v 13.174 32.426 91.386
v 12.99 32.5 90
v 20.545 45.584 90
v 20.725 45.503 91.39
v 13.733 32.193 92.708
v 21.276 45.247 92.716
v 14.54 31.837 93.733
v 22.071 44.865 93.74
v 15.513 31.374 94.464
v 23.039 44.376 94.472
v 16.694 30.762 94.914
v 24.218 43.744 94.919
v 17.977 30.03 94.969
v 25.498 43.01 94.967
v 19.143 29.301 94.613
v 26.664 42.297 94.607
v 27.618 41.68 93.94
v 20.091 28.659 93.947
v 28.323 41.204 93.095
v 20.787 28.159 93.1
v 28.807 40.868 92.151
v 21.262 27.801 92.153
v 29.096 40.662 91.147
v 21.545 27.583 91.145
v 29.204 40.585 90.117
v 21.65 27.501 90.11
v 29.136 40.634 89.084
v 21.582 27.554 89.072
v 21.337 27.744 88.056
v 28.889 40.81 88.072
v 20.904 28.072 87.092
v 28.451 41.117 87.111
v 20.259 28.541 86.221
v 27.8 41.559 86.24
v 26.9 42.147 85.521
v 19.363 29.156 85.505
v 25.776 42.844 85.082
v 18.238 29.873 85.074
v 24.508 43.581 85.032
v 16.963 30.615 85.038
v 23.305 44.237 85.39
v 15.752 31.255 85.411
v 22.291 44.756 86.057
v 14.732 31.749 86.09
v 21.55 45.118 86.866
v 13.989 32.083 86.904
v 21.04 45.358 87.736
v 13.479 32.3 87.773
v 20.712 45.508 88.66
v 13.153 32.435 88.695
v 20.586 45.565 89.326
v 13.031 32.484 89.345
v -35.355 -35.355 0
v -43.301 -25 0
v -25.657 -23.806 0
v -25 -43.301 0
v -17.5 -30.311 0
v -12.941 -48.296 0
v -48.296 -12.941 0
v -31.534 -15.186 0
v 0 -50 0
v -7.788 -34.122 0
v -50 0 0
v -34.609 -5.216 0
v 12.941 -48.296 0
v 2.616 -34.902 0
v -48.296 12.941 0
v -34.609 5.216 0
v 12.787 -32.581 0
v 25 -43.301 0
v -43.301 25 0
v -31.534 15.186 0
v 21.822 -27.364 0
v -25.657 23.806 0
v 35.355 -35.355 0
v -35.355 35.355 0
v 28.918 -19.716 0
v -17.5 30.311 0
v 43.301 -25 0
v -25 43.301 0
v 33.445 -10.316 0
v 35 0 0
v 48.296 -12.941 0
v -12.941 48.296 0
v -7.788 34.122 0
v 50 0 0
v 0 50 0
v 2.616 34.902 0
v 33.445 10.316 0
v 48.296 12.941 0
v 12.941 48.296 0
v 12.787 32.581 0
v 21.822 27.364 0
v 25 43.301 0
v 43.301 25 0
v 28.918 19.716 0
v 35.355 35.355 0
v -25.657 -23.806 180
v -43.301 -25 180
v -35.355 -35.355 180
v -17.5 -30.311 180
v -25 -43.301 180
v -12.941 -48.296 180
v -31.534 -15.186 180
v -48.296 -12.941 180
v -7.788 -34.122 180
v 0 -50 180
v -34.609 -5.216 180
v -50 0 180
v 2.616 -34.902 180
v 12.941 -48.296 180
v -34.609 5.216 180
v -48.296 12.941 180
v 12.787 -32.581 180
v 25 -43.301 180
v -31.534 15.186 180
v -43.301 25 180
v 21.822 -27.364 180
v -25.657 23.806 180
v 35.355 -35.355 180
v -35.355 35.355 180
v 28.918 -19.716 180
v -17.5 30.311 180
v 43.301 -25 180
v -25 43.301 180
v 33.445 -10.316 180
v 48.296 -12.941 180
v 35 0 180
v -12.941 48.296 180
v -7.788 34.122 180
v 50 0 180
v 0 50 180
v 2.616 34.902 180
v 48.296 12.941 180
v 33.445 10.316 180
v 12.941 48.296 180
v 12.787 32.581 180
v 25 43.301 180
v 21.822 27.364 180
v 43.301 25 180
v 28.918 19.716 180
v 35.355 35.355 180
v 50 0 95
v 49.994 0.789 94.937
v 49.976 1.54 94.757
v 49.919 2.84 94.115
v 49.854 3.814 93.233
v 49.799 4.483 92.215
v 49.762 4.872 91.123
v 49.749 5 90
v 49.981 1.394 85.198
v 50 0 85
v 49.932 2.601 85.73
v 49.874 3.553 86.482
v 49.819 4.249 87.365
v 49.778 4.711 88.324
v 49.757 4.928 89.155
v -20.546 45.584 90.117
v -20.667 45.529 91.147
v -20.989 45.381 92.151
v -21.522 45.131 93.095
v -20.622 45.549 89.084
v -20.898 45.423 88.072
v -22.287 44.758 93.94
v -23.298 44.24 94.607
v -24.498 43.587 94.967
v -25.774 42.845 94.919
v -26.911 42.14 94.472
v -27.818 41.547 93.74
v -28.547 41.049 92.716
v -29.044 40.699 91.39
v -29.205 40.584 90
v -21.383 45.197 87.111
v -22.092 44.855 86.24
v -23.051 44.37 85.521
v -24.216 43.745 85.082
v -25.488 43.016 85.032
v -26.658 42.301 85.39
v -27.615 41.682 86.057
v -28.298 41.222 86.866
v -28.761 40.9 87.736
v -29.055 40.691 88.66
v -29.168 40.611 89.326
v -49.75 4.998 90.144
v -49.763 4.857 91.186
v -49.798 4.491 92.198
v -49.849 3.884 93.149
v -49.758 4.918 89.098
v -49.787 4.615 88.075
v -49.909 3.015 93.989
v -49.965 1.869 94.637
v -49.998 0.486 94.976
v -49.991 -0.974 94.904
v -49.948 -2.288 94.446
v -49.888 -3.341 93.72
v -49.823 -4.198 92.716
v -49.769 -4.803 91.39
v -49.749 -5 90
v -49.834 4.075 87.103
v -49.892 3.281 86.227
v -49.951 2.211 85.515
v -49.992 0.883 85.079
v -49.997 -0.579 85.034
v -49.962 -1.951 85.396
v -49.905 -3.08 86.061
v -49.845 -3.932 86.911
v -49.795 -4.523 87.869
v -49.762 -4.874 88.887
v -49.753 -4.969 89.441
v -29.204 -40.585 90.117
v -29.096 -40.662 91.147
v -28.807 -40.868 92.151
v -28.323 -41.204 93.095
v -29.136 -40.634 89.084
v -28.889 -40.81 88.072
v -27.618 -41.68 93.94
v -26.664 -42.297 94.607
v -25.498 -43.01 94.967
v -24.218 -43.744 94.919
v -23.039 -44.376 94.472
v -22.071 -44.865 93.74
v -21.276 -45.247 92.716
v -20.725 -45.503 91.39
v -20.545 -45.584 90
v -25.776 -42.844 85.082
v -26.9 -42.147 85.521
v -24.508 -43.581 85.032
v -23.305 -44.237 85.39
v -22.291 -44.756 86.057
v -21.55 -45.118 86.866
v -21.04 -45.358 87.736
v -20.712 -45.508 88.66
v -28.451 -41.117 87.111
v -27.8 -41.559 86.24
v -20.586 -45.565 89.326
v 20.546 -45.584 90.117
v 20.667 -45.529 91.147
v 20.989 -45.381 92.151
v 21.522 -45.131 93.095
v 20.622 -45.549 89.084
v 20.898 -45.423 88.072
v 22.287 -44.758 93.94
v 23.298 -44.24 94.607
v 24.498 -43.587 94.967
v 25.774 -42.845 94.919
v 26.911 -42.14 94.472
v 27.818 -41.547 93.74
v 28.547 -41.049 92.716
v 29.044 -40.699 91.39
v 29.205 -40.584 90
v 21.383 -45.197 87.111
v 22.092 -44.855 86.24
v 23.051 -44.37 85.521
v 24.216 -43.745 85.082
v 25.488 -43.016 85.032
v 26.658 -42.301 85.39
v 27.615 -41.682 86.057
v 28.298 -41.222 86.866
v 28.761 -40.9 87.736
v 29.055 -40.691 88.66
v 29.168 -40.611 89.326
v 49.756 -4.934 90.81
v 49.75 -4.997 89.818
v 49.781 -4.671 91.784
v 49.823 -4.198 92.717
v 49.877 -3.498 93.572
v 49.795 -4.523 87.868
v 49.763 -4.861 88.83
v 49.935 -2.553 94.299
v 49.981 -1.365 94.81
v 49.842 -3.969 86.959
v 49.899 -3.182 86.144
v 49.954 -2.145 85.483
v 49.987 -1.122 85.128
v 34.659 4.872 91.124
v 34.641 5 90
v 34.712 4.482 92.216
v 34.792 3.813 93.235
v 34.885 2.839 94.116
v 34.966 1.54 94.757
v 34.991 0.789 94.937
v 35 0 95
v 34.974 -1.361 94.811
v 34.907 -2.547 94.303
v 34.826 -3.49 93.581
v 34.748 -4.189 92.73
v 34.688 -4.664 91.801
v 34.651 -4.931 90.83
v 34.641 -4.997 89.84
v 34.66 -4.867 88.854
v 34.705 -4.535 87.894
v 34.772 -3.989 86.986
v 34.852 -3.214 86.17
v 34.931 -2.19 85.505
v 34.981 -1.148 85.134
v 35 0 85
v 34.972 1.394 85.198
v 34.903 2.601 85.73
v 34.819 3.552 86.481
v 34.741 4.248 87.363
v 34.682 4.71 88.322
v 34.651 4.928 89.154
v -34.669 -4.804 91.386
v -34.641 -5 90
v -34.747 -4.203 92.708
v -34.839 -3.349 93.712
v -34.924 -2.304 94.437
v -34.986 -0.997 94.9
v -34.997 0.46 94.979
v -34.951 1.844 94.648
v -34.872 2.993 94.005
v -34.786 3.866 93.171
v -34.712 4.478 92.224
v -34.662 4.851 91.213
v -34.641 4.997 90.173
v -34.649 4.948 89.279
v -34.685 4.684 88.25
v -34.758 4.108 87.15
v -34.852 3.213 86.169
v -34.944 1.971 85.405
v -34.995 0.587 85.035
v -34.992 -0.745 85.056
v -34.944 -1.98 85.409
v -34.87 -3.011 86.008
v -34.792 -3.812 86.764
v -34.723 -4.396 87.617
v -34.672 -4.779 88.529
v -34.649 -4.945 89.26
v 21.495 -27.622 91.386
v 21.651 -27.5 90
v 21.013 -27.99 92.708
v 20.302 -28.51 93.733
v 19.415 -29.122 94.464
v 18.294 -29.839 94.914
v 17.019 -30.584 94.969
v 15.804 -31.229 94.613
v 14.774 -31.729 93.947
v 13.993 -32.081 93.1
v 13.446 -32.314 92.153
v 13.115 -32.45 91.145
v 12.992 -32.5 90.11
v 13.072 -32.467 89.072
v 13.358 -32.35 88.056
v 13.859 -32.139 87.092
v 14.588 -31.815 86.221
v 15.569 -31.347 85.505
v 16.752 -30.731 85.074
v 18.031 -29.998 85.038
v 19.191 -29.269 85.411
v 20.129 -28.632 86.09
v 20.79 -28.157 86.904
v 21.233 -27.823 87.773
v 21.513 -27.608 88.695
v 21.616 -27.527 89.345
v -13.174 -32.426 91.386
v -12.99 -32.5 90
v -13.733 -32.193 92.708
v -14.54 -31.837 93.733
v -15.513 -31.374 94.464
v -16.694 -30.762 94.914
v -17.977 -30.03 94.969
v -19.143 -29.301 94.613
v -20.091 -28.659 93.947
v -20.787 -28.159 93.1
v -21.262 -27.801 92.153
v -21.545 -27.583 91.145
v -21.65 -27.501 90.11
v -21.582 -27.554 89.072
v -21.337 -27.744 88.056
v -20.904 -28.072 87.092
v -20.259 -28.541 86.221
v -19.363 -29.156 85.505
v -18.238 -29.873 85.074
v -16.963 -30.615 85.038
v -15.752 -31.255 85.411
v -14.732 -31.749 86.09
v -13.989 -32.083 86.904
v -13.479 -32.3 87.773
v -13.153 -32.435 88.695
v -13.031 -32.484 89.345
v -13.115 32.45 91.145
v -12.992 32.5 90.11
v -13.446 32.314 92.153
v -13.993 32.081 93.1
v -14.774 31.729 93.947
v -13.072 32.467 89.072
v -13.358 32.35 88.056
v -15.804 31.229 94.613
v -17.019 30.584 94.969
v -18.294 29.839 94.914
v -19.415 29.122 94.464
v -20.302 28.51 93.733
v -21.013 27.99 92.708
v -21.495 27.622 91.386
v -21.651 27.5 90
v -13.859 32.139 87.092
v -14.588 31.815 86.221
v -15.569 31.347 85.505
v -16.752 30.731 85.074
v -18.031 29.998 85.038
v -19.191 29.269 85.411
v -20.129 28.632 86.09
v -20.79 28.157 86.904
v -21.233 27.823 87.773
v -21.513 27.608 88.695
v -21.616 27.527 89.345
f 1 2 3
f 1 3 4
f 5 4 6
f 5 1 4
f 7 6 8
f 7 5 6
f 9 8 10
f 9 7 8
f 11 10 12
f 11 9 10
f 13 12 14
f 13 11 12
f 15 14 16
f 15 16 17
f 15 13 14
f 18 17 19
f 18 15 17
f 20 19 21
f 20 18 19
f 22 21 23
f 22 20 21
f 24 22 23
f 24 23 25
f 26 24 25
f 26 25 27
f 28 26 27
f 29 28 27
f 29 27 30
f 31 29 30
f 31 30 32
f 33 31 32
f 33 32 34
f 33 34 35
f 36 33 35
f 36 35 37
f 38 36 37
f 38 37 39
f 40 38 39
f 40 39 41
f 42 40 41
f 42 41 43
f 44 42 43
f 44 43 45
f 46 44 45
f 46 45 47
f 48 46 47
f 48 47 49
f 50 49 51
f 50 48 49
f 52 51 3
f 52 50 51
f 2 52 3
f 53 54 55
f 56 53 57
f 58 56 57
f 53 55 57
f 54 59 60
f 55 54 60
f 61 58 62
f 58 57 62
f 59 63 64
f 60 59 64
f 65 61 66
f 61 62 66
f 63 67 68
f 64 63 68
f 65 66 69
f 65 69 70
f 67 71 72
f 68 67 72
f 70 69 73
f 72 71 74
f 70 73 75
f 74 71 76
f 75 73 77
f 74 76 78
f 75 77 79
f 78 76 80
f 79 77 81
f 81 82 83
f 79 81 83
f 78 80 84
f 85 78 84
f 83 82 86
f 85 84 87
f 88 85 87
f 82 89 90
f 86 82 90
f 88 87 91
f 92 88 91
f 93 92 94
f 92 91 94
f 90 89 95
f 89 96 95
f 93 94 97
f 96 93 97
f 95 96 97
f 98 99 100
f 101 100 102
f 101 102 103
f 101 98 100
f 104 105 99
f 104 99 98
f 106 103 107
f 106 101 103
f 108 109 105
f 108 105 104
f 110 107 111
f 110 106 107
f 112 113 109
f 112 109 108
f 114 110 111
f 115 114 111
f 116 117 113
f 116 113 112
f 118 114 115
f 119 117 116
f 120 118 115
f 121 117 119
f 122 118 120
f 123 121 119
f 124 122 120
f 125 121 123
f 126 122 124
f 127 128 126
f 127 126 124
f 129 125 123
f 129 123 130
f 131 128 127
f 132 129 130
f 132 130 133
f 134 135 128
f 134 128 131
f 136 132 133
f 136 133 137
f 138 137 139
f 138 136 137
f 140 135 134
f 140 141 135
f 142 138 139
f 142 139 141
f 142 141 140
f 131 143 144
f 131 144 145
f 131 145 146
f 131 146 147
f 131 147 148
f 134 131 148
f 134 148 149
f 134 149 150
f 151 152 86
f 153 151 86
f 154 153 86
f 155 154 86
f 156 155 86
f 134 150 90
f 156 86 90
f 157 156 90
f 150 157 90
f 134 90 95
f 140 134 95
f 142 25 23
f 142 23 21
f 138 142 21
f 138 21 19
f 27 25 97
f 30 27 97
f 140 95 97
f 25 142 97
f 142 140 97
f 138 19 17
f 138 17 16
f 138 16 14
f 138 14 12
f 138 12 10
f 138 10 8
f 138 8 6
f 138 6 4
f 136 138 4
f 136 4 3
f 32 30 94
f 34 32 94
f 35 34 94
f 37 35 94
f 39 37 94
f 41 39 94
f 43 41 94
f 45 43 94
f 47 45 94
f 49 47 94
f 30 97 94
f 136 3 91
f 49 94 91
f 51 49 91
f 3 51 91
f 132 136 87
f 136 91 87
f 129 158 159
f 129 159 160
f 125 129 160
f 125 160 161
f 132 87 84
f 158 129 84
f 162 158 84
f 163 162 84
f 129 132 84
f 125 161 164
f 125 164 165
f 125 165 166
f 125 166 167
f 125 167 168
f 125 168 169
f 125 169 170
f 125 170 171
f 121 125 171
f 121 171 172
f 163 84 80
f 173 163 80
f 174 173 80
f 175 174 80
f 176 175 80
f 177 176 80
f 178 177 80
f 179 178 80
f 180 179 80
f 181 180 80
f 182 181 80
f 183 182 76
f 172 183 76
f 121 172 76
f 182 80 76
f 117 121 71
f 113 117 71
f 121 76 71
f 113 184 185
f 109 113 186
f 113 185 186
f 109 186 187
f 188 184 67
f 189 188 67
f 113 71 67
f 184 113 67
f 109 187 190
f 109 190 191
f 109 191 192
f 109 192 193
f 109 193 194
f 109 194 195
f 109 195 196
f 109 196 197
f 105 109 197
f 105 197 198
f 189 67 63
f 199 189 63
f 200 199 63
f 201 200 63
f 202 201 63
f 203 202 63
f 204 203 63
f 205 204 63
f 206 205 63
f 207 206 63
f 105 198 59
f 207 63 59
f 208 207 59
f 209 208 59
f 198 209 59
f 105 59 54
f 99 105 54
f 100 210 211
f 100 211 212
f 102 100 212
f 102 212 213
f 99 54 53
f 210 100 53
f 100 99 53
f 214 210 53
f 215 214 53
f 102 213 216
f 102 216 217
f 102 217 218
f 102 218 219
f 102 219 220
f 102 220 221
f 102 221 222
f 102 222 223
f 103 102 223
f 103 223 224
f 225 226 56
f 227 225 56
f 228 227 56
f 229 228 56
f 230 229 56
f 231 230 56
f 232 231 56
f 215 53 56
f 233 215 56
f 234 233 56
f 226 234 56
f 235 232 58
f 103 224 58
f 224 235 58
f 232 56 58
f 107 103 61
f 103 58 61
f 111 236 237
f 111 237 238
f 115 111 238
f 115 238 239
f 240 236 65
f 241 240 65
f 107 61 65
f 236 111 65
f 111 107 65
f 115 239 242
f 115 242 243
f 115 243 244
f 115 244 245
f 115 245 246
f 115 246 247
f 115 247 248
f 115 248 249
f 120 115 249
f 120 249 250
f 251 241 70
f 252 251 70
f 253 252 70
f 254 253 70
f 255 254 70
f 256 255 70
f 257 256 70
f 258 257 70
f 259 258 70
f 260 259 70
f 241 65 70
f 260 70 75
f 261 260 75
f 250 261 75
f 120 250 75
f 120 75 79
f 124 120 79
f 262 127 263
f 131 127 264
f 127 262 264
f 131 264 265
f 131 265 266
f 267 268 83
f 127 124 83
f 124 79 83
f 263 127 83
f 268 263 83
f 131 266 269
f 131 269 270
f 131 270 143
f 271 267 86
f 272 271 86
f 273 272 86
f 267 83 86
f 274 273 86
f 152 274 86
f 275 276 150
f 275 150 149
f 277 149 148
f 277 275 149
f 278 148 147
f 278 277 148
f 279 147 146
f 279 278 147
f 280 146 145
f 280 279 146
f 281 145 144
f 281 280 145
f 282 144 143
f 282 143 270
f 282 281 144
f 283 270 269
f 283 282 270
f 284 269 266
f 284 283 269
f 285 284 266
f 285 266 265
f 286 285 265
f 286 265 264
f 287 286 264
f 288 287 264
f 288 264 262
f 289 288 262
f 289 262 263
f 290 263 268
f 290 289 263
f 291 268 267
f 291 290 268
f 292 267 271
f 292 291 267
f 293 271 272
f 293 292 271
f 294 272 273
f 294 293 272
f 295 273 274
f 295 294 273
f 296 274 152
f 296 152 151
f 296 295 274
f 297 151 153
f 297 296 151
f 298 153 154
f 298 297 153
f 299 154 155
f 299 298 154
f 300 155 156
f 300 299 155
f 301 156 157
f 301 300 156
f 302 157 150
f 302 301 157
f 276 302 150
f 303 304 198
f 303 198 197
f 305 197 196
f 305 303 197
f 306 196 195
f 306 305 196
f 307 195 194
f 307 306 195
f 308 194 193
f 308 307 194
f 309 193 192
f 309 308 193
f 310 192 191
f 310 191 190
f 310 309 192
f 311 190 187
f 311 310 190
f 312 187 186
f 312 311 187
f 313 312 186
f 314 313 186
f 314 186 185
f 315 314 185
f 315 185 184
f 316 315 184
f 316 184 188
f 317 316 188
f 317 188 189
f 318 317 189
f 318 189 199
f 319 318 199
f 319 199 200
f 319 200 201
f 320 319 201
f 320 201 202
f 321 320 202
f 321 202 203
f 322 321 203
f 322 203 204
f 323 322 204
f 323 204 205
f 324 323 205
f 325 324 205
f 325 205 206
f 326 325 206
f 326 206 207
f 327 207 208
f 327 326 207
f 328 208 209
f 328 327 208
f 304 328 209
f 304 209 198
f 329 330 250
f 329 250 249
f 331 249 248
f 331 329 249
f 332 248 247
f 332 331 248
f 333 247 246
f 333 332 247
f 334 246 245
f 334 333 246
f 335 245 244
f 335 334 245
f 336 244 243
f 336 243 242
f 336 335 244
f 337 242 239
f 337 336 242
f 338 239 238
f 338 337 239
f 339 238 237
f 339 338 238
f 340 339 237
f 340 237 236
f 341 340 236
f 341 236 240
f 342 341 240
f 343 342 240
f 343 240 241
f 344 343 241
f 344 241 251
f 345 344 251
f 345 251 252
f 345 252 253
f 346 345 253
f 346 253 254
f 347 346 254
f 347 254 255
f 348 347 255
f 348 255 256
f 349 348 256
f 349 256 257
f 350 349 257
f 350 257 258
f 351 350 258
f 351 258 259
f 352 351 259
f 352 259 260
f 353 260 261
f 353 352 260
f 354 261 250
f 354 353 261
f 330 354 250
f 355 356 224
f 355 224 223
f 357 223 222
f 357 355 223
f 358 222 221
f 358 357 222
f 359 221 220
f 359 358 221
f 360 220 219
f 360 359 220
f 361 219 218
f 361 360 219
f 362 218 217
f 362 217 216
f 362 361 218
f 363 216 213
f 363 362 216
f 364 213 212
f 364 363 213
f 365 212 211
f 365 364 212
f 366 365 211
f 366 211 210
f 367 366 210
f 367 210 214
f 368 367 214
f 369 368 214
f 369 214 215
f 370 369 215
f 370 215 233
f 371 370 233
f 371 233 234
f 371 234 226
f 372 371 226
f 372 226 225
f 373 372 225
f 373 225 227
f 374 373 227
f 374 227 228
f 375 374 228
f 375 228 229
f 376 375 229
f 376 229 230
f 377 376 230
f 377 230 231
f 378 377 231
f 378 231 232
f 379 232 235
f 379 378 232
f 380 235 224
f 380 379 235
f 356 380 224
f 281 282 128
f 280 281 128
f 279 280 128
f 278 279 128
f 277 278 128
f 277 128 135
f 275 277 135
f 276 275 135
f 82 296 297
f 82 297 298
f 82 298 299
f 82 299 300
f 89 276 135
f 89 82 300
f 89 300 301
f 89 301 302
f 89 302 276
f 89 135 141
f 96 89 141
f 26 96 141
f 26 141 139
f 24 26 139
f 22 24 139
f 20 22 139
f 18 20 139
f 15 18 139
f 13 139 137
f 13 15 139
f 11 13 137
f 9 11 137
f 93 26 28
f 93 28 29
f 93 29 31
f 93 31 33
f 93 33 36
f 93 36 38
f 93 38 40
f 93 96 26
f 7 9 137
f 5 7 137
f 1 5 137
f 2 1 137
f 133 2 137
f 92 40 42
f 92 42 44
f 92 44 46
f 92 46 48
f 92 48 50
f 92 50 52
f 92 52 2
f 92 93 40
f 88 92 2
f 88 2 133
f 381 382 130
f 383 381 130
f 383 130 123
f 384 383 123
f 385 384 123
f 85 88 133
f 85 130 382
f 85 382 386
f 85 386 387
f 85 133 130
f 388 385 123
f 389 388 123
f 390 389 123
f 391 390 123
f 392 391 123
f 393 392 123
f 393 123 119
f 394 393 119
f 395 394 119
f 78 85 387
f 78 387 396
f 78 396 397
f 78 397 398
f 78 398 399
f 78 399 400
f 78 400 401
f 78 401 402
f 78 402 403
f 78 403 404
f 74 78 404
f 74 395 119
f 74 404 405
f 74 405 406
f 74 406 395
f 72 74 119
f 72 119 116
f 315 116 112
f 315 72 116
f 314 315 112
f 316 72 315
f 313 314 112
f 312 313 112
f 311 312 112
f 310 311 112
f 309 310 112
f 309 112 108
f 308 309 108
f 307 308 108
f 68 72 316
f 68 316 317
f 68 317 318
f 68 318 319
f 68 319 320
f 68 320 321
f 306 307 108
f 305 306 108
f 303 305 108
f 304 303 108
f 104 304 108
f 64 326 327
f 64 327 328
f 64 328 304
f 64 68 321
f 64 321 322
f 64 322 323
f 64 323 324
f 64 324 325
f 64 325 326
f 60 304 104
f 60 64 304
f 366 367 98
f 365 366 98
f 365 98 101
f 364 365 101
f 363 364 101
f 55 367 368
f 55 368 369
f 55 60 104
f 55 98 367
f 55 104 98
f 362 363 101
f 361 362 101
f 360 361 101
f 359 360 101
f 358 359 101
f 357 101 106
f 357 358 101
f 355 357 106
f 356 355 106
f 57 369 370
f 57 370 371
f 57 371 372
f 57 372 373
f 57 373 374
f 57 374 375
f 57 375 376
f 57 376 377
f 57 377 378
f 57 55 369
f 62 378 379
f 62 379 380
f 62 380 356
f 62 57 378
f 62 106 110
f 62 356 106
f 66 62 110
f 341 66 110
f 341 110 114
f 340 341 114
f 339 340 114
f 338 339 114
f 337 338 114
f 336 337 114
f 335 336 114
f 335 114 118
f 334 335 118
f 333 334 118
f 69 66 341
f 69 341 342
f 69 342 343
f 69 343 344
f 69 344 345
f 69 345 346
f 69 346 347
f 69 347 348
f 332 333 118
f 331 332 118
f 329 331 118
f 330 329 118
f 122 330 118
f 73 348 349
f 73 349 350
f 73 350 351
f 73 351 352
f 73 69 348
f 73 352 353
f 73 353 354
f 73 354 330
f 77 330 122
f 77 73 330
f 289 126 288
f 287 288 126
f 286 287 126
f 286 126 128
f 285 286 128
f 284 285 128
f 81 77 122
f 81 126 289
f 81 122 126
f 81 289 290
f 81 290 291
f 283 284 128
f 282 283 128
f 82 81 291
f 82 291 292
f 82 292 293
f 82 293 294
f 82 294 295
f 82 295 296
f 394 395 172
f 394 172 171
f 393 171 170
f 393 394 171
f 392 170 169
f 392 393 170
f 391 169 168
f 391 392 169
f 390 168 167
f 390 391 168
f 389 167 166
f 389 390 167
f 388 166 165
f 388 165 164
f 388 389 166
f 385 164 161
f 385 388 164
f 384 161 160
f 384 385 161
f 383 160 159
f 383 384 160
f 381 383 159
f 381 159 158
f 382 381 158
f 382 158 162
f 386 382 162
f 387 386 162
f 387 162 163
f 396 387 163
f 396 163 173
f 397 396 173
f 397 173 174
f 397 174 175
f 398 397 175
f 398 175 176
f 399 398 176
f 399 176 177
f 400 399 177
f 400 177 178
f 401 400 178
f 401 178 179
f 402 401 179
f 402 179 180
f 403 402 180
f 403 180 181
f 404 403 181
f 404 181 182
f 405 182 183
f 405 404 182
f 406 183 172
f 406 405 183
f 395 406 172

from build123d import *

# Parameters (mm, degrees)
F0_R     = 50
F0_R_2   = 35
F1_DEPTH = 180
F2_R     = 5
F3_DEPTH = 60
F4_COUNT = 6


with BuildPart() as f1:
    # F0 (on Top) → F1 (new body)
    with BuildSketch(Plane.XY):
        Circle(F0_R)
        Circle(F0_R_2, mode=Mode.SUBTRACT)
    extrude(amount=F1_DEPTH)


with BuildPart() as f3:
    # F2 (on Right) → F3 (new body)
    with BuildSketch(Plane.YZ):
        with Locations((0, 90)):
            Circle(F2_R)
    extrude(amount=F3_DEPTH)


with BuildPart() as f4_1:
    # F4: instance of F3
    add(f3.part.rotate(Axis((0, 0, 90), (0, 0, 1)), 1 * 360 / F4_COUNT))


with BuildPart() as f4_2:
    # F4: instance of F3
    add(f3.part.rotate(Axis((0, 0, 90), (0, 0, 1)), 2 * 360 / F4_COUNT))


with BuildPart() as f4_3:
    # F4: instance of F3
    add(f3.part.rotate(Axis((0, 0, 90), (0, 0, 1)), 3 * 360 / F4_COUNT))


with BuildPart() as f4_4:
    # F4: instance of F3
    add(f3.part.rotate(Axis((0, 0, 90), (0, 0, 1)), 4 * 360 / F4_COUNT))


with BuildPart() as f4_5:
    # F4: instance of F3
    add(f3.part.rotate(Axis((0, 0, 90), (0, 0, 1)), 5 * 360 / F4_COUNT))


with BuildPart() as f1_1:
    add(f1.part)

    # F5: cut F4_4, F4_5, F3, F4_1, F4_2, F4_3
    add(f4_4.part, mode=Mode.SUBTRACT)
    add(f4_5.part, mode=Mode.SUBTRACT)
    add(f3.part, mode=Mode.SUBTRACT)
    add(f4_1.part, mode=Mode.SUBTRACT)
    add(f4_2.part, mode=Mode.SUBTRACT)
    add(f4_3.part, mode=Mode.SUBTRACT)


solid = f1_1.part
